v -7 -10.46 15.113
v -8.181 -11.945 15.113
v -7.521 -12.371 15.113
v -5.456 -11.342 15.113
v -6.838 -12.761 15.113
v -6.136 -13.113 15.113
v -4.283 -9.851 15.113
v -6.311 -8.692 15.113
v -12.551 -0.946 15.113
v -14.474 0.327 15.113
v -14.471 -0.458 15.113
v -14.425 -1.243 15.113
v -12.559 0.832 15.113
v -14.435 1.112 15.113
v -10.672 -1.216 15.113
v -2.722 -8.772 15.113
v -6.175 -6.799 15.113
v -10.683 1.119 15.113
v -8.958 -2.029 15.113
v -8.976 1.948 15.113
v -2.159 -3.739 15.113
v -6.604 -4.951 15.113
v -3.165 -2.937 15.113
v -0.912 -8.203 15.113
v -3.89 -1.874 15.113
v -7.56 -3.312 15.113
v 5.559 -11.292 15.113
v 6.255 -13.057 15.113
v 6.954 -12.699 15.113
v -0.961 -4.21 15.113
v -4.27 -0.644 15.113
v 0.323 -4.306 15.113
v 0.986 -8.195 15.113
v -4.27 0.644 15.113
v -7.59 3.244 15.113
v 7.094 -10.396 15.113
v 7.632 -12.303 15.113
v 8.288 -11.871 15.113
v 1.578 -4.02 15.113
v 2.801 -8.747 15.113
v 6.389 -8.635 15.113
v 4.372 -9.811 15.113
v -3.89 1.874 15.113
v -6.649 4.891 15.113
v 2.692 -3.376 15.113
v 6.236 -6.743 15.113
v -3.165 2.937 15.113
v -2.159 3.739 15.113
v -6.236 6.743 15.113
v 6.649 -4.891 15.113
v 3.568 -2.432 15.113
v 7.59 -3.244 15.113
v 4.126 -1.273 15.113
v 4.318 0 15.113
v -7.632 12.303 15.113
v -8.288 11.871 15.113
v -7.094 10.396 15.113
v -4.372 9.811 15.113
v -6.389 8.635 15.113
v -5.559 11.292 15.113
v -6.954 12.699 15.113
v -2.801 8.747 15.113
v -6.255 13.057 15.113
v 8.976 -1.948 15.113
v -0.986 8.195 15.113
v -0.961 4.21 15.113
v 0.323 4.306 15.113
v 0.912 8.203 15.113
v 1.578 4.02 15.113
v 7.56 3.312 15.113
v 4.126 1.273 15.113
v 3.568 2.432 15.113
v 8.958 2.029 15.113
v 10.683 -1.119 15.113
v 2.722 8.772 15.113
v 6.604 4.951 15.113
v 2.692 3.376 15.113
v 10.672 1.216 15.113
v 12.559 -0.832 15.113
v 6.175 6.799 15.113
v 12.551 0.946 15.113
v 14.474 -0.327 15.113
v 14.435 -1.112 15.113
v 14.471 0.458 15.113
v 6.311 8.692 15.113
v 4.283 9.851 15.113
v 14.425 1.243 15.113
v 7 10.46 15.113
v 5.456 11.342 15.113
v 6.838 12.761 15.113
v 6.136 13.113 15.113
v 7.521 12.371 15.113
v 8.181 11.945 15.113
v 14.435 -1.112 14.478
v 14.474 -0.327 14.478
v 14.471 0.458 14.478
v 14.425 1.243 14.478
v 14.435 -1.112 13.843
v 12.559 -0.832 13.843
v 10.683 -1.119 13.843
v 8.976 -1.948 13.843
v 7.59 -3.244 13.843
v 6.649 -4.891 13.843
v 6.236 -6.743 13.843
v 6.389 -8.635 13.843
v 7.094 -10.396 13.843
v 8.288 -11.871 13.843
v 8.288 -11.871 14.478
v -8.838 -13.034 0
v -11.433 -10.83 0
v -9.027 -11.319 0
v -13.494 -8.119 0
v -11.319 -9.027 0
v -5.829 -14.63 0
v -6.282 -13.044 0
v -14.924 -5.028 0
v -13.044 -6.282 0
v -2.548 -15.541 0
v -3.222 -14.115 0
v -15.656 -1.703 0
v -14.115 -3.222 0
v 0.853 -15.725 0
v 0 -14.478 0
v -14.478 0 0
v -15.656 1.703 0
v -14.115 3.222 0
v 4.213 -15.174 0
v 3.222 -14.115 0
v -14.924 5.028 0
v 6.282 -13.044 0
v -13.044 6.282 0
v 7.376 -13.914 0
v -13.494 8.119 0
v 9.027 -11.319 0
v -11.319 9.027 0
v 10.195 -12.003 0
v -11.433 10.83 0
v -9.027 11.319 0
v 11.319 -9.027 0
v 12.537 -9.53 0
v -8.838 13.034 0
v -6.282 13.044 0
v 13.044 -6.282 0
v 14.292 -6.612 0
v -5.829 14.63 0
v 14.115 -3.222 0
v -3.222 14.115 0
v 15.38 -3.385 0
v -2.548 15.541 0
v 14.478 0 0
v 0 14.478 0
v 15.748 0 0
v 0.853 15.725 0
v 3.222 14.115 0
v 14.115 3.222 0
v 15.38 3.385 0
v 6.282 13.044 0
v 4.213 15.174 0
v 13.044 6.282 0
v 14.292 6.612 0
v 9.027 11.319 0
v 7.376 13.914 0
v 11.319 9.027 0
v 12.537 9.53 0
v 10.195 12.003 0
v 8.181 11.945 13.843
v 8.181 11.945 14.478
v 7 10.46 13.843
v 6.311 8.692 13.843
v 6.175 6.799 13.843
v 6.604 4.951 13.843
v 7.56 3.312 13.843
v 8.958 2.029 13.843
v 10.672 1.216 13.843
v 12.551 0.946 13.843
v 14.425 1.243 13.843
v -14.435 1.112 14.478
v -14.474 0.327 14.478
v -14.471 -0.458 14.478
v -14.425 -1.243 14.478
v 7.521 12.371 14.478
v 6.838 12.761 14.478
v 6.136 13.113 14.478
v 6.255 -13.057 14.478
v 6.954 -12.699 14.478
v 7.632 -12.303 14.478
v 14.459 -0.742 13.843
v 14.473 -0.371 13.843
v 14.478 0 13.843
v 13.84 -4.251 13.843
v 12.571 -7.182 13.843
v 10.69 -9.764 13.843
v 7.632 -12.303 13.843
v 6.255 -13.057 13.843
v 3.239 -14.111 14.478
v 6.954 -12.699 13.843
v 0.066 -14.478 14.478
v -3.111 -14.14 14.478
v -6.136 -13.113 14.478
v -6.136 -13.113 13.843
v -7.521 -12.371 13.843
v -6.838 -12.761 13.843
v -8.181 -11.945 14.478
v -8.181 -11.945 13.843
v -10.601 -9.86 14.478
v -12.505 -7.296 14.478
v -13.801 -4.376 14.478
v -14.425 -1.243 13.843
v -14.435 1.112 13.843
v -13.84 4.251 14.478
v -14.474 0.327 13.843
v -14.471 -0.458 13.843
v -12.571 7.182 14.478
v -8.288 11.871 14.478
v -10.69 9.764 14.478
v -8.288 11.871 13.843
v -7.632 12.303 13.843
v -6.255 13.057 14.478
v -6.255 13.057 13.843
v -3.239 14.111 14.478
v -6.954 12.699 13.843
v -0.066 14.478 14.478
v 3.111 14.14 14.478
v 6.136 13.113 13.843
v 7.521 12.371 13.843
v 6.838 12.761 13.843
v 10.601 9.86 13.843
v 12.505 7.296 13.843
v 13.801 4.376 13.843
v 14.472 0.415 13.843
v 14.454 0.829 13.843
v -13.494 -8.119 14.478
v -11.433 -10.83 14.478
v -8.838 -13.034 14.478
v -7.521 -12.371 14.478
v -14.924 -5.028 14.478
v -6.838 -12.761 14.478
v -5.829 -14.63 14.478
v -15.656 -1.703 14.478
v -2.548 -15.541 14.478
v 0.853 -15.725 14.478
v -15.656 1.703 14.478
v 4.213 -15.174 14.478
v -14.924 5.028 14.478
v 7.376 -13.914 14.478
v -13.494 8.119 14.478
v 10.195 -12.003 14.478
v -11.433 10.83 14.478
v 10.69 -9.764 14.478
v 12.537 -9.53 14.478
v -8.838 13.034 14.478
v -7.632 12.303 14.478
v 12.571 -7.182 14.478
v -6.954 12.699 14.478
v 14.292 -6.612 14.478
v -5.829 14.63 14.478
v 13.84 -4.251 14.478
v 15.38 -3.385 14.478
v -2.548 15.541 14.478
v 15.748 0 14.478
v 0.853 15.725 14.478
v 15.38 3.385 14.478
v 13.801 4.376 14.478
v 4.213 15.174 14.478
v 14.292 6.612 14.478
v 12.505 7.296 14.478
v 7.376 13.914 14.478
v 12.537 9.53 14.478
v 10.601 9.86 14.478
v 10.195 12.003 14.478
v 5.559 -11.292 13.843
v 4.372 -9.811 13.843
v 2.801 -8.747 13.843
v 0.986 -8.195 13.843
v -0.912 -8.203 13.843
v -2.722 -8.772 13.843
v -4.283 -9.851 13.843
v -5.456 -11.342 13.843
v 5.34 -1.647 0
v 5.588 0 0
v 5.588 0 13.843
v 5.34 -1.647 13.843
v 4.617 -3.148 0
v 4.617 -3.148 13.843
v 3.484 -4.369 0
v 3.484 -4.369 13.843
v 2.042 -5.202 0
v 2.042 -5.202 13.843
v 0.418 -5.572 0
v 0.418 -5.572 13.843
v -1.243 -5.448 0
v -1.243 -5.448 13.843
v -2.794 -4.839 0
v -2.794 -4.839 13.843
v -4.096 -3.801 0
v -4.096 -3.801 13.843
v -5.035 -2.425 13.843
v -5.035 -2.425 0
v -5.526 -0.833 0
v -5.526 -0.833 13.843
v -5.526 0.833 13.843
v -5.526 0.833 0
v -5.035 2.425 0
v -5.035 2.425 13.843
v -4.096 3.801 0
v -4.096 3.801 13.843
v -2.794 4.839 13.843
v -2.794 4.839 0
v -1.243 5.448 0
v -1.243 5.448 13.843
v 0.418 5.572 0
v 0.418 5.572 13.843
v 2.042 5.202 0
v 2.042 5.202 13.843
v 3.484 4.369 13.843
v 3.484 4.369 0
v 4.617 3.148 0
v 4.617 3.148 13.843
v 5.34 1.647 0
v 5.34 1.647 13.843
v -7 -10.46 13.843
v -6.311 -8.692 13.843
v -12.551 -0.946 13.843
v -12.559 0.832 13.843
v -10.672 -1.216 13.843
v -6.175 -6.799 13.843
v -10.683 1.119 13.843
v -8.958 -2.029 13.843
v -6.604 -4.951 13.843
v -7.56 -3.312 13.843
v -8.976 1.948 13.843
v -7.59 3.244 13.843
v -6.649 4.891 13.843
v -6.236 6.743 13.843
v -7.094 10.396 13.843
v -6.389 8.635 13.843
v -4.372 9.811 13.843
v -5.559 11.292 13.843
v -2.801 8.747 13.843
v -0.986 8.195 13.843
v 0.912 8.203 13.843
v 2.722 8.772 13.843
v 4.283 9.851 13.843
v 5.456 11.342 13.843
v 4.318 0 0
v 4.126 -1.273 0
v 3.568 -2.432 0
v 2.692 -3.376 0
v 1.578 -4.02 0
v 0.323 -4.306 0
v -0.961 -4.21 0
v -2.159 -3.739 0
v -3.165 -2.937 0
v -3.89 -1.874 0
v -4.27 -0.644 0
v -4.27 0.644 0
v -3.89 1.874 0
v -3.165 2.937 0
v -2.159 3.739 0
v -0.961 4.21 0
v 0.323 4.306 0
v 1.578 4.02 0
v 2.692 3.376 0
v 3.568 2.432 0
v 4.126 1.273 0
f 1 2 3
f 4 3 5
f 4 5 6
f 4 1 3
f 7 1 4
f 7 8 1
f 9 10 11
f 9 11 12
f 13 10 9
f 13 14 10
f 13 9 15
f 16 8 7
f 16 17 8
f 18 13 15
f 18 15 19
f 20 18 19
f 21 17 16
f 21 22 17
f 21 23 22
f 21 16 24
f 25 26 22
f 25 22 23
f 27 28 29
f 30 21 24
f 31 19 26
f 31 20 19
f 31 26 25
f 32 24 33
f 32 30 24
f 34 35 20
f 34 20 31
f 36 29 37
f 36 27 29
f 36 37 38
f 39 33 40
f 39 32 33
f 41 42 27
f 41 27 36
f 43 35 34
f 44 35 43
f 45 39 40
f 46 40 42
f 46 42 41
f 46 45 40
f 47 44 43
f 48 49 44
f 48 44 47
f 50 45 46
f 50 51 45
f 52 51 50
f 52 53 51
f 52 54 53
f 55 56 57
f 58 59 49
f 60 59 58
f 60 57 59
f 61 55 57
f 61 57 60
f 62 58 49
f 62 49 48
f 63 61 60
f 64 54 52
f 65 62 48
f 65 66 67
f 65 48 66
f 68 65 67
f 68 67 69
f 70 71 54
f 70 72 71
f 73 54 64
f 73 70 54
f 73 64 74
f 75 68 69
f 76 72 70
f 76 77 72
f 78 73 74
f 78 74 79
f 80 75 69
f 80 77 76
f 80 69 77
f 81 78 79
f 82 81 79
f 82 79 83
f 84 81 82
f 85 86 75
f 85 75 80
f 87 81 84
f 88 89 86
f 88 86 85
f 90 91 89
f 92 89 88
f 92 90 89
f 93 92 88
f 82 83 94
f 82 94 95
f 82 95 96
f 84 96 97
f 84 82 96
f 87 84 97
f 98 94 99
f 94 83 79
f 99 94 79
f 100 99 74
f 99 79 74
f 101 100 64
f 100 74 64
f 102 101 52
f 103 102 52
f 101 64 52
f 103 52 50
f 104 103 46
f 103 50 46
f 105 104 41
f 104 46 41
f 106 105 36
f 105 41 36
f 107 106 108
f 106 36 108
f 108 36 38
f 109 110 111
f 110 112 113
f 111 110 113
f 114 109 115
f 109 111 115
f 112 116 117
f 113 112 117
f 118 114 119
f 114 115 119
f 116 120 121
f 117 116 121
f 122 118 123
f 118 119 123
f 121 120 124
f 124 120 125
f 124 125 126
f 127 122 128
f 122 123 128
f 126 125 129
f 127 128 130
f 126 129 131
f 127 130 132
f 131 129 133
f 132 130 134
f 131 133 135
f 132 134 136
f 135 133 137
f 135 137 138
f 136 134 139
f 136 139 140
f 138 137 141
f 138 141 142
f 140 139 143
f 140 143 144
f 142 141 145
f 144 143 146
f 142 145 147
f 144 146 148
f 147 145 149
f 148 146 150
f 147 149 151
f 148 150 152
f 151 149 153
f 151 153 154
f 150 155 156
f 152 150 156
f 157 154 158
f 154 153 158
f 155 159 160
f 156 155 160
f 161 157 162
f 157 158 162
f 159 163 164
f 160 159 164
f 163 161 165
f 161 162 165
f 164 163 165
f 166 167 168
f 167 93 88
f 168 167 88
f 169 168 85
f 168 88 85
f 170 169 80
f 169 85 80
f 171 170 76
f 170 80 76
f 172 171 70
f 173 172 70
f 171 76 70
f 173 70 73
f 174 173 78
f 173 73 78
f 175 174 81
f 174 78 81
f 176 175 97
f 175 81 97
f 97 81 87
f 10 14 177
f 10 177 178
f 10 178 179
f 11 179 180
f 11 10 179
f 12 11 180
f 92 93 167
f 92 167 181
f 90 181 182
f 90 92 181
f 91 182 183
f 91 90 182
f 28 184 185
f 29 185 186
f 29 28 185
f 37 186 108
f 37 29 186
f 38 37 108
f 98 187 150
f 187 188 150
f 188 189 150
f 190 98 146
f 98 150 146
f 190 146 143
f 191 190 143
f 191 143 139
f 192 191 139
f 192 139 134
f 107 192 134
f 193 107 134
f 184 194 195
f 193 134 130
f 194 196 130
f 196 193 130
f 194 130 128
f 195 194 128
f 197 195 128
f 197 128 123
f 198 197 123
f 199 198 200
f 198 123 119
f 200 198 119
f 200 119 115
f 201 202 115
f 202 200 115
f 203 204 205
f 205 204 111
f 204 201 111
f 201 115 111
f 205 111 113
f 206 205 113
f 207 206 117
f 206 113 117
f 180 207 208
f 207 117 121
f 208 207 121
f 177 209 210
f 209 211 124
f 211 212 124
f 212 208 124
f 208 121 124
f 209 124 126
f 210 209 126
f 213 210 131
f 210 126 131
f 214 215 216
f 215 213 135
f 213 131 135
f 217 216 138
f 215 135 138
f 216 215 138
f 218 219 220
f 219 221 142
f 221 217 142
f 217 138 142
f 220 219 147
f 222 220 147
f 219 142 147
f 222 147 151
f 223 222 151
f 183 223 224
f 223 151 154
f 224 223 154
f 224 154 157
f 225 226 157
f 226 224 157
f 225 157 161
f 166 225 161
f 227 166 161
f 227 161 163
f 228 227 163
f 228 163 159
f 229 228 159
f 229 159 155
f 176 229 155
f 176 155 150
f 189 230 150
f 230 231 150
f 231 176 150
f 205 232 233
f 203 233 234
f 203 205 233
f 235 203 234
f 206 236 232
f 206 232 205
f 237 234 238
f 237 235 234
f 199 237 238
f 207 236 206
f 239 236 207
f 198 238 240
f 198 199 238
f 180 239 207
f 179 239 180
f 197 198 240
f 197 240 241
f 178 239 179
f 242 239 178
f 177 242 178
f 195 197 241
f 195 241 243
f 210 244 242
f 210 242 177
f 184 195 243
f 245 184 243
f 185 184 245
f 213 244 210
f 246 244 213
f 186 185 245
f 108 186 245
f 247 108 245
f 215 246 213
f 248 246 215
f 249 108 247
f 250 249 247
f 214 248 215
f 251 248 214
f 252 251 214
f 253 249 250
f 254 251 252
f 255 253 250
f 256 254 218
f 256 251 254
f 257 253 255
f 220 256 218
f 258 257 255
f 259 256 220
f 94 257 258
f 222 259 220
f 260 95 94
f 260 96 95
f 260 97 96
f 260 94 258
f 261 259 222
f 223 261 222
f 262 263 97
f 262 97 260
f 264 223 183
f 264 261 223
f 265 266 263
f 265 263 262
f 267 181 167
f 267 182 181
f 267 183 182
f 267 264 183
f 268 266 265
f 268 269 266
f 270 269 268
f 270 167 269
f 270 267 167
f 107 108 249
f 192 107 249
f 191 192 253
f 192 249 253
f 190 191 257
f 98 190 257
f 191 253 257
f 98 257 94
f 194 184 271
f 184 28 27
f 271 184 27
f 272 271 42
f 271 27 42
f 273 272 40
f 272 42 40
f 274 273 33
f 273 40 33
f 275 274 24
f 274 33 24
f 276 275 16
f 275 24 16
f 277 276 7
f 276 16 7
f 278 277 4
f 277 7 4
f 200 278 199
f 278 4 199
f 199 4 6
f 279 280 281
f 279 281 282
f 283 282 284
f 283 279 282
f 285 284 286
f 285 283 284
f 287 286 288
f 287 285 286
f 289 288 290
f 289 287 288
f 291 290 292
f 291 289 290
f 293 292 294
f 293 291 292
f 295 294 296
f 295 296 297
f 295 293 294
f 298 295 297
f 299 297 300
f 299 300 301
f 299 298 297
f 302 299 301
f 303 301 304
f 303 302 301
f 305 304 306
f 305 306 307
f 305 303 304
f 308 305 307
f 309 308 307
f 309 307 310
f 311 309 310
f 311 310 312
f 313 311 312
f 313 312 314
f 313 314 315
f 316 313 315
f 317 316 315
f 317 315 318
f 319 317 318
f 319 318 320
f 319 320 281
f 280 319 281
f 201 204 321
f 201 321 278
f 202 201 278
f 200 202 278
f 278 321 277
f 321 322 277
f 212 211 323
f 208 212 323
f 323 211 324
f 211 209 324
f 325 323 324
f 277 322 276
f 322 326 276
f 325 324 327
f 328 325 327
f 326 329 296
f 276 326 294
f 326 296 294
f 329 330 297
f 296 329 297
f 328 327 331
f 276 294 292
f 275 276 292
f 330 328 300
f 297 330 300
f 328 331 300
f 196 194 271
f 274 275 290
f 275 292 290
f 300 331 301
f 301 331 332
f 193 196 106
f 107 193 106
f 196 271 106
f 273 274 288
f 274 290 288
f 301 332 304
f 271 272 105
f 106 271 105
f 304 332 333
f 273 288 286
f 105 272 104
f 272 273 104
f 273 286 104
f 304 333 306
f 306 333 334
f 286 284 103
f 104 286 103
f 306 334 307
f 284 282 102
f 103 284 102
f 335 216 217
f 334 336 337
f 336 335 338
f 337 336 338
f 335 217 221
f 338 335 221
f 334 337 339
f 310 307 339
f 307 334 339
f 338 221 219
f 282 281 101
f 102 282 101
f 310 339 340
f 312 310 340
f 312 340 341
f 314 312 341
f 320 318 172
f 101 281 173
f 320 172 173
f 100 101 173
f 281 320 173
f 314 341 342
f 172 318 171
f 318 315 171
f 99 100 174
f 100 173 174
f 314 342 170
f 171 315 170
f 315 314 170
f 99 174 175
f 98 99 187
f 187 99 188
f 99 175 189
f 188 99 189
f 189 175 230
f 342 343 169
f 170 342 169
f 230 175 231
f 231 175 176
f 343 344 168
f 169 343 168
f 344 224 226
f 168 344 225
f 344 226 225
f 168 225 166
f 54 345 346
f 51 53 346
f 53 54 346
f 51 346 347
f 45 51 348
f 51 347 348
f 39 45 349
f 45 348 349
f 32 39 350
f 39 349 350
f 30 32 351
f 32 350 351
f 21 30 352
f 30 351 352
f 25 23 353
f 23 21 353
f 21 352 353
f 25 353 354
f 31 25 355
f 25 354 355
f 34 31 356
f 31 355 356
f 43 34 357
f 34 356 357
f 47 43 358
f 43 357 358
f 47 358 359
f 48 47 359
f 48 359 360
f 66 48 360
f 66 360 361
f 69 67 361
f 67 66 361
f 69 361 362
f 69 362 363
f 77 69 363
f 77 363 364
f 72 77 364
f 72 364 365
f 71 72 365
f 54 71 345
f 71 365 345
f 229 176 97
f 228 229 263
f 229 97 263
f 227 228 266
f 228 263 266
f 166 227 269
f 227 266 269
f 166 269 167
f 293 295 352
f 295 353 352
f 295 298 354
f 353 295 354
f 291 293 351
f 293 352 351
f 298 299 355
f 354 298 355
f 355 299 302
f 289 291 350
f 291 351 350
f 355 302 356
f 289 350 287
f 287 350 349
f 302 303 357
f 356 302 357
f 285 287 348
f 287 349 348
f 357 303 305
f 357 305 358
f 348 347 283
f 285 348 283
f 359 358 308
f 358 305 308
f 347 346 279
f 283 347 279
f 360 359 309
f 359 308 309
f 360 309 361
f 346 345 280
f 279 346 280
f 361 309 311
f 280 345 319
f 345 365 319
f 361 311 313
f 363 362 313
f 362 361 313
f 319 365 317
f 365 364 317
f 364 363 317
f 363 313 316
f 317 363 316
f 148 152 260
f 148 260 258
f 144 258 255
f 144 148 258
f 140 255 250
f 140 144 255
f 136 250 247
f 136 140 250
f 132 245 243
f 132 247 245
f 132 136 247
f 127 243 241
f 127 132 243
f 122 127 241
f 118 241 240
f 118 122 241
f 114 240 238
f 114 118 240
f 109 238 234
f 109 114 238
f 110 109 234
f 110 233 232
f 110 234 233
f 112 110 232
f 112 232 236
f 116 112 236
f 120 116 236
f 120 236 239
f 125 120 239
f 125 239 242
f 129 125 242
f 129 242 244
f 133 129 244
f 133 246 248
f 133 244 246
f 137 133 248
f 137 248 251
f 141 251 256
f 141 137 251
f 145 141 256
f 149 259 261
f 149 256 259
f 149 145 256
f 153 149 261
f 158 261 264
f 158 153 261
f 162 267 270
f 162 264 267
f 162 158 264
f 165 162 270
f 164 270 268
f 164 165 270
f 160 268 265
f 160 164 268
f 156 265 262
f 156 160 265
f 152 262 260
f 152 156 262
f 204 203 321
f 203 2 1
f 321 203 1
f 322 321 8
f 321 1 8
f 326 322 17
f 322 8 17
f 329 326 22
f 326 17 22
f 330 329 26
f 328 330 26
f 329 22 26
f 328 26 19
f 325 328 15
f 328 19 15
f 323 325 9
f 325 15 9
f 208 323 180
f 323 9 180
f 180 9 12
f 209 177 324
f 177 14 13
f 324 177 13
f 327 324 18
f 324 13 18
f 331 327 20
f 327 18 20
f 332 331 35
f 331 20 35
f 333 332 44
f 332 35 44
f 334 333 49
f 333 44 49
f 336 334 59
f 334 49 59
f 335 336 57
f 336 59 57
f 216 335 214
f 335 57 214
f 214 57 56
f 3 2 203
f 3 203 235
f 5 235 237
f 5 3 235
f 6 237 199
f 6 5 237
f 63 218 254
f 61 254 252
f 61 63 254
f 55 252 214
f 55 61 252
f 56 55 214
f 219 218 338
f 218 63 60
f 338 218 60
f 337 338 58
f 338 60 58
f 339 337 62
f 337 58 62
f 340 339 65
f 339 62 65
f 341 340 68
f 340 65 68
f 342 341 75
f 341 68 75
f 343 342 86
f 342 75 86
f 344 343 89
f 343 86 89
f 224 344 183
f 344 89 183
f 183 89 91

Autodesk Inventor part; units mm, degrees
ref_plane "YZ Plane" through (0, 0, 0) normal (1, 0, 0) x (0, 1, 0)
ref_plane "XZ Plane" through (0, 0, 0) normal (0, 1, 0) x (-1, 0, 0)
ref_plane "XY Plane" through (0, 0, 0) normal (0, 0, 1) x (1, 0, 0)
sketch "Sketch1" plane through (0, 0, 0) normal (0, 0, 1) x (1, 0, 0)
  circle A0 centre (0, 0) radius 5.588
  circle A1 centre (0, 0) radius 4.318
  circle A2 centre (0, 0) radius 14.478
  circle A3 centre (0, 0) radius 15.748
  dimension "d0" = 11.176
  dimension "d1" = 1.27
  dimension "d2" = 8.89
  dimension "d3" = 1.27
extrude "Extrusion1" add sketch "Sketch1" along normal blind 14.478
ref_plane "Work Plane1" through (0, 0, 14.478) normal (0, 0, 1) x (1, 0, 0)
sketch "Sketch2" plane through (0, 0, 14.478) normal (0, 0, 1) x (1, 0, 0)
  circle A0 centre (0, 0) radius 14.478 projected
  circle A1 centre (0, 0) radius 15.748 projected
  circle A2 centre (0, 0) radius 4.318 projected
  circle A3 centre (0, 0) radius 5.588 projected
extrude "Extrusion2" add sketch "Sketch2" along normal mid plane 1.27 contours A0 | A3
sketch "Sketch3" plane through (0, 0, 15.113) normal (0, 0, 1) x (1, 0, 0)
  circle A0 centre (0, 0) radius 14.478 projected
  circle A1 centre (0, 0) radius 14.478 projected
  arc A2 (-6.2546, 13.0573) -> (6.1362, 13.1134) centre (-0.0655, 14.4779) ccw
  arc A3 (6.1362, 13.1134) -> (-6.2546, 13.0573) centre (0, 0) ccw
  dimension "d9" = 12.7
extrude "Extrusion3" cut sketch "Sketch3" against normal blind 1.27 contours A2 A0 picked at (-1.876, 12.3773)
pattern_circular "Circular Pattern1" count 6 over 360 about axis through (0, 0, 14.478) along (0, 0, 1) of "Extrusion3"
properties part number "Wheel" material "ABS Plastic"
